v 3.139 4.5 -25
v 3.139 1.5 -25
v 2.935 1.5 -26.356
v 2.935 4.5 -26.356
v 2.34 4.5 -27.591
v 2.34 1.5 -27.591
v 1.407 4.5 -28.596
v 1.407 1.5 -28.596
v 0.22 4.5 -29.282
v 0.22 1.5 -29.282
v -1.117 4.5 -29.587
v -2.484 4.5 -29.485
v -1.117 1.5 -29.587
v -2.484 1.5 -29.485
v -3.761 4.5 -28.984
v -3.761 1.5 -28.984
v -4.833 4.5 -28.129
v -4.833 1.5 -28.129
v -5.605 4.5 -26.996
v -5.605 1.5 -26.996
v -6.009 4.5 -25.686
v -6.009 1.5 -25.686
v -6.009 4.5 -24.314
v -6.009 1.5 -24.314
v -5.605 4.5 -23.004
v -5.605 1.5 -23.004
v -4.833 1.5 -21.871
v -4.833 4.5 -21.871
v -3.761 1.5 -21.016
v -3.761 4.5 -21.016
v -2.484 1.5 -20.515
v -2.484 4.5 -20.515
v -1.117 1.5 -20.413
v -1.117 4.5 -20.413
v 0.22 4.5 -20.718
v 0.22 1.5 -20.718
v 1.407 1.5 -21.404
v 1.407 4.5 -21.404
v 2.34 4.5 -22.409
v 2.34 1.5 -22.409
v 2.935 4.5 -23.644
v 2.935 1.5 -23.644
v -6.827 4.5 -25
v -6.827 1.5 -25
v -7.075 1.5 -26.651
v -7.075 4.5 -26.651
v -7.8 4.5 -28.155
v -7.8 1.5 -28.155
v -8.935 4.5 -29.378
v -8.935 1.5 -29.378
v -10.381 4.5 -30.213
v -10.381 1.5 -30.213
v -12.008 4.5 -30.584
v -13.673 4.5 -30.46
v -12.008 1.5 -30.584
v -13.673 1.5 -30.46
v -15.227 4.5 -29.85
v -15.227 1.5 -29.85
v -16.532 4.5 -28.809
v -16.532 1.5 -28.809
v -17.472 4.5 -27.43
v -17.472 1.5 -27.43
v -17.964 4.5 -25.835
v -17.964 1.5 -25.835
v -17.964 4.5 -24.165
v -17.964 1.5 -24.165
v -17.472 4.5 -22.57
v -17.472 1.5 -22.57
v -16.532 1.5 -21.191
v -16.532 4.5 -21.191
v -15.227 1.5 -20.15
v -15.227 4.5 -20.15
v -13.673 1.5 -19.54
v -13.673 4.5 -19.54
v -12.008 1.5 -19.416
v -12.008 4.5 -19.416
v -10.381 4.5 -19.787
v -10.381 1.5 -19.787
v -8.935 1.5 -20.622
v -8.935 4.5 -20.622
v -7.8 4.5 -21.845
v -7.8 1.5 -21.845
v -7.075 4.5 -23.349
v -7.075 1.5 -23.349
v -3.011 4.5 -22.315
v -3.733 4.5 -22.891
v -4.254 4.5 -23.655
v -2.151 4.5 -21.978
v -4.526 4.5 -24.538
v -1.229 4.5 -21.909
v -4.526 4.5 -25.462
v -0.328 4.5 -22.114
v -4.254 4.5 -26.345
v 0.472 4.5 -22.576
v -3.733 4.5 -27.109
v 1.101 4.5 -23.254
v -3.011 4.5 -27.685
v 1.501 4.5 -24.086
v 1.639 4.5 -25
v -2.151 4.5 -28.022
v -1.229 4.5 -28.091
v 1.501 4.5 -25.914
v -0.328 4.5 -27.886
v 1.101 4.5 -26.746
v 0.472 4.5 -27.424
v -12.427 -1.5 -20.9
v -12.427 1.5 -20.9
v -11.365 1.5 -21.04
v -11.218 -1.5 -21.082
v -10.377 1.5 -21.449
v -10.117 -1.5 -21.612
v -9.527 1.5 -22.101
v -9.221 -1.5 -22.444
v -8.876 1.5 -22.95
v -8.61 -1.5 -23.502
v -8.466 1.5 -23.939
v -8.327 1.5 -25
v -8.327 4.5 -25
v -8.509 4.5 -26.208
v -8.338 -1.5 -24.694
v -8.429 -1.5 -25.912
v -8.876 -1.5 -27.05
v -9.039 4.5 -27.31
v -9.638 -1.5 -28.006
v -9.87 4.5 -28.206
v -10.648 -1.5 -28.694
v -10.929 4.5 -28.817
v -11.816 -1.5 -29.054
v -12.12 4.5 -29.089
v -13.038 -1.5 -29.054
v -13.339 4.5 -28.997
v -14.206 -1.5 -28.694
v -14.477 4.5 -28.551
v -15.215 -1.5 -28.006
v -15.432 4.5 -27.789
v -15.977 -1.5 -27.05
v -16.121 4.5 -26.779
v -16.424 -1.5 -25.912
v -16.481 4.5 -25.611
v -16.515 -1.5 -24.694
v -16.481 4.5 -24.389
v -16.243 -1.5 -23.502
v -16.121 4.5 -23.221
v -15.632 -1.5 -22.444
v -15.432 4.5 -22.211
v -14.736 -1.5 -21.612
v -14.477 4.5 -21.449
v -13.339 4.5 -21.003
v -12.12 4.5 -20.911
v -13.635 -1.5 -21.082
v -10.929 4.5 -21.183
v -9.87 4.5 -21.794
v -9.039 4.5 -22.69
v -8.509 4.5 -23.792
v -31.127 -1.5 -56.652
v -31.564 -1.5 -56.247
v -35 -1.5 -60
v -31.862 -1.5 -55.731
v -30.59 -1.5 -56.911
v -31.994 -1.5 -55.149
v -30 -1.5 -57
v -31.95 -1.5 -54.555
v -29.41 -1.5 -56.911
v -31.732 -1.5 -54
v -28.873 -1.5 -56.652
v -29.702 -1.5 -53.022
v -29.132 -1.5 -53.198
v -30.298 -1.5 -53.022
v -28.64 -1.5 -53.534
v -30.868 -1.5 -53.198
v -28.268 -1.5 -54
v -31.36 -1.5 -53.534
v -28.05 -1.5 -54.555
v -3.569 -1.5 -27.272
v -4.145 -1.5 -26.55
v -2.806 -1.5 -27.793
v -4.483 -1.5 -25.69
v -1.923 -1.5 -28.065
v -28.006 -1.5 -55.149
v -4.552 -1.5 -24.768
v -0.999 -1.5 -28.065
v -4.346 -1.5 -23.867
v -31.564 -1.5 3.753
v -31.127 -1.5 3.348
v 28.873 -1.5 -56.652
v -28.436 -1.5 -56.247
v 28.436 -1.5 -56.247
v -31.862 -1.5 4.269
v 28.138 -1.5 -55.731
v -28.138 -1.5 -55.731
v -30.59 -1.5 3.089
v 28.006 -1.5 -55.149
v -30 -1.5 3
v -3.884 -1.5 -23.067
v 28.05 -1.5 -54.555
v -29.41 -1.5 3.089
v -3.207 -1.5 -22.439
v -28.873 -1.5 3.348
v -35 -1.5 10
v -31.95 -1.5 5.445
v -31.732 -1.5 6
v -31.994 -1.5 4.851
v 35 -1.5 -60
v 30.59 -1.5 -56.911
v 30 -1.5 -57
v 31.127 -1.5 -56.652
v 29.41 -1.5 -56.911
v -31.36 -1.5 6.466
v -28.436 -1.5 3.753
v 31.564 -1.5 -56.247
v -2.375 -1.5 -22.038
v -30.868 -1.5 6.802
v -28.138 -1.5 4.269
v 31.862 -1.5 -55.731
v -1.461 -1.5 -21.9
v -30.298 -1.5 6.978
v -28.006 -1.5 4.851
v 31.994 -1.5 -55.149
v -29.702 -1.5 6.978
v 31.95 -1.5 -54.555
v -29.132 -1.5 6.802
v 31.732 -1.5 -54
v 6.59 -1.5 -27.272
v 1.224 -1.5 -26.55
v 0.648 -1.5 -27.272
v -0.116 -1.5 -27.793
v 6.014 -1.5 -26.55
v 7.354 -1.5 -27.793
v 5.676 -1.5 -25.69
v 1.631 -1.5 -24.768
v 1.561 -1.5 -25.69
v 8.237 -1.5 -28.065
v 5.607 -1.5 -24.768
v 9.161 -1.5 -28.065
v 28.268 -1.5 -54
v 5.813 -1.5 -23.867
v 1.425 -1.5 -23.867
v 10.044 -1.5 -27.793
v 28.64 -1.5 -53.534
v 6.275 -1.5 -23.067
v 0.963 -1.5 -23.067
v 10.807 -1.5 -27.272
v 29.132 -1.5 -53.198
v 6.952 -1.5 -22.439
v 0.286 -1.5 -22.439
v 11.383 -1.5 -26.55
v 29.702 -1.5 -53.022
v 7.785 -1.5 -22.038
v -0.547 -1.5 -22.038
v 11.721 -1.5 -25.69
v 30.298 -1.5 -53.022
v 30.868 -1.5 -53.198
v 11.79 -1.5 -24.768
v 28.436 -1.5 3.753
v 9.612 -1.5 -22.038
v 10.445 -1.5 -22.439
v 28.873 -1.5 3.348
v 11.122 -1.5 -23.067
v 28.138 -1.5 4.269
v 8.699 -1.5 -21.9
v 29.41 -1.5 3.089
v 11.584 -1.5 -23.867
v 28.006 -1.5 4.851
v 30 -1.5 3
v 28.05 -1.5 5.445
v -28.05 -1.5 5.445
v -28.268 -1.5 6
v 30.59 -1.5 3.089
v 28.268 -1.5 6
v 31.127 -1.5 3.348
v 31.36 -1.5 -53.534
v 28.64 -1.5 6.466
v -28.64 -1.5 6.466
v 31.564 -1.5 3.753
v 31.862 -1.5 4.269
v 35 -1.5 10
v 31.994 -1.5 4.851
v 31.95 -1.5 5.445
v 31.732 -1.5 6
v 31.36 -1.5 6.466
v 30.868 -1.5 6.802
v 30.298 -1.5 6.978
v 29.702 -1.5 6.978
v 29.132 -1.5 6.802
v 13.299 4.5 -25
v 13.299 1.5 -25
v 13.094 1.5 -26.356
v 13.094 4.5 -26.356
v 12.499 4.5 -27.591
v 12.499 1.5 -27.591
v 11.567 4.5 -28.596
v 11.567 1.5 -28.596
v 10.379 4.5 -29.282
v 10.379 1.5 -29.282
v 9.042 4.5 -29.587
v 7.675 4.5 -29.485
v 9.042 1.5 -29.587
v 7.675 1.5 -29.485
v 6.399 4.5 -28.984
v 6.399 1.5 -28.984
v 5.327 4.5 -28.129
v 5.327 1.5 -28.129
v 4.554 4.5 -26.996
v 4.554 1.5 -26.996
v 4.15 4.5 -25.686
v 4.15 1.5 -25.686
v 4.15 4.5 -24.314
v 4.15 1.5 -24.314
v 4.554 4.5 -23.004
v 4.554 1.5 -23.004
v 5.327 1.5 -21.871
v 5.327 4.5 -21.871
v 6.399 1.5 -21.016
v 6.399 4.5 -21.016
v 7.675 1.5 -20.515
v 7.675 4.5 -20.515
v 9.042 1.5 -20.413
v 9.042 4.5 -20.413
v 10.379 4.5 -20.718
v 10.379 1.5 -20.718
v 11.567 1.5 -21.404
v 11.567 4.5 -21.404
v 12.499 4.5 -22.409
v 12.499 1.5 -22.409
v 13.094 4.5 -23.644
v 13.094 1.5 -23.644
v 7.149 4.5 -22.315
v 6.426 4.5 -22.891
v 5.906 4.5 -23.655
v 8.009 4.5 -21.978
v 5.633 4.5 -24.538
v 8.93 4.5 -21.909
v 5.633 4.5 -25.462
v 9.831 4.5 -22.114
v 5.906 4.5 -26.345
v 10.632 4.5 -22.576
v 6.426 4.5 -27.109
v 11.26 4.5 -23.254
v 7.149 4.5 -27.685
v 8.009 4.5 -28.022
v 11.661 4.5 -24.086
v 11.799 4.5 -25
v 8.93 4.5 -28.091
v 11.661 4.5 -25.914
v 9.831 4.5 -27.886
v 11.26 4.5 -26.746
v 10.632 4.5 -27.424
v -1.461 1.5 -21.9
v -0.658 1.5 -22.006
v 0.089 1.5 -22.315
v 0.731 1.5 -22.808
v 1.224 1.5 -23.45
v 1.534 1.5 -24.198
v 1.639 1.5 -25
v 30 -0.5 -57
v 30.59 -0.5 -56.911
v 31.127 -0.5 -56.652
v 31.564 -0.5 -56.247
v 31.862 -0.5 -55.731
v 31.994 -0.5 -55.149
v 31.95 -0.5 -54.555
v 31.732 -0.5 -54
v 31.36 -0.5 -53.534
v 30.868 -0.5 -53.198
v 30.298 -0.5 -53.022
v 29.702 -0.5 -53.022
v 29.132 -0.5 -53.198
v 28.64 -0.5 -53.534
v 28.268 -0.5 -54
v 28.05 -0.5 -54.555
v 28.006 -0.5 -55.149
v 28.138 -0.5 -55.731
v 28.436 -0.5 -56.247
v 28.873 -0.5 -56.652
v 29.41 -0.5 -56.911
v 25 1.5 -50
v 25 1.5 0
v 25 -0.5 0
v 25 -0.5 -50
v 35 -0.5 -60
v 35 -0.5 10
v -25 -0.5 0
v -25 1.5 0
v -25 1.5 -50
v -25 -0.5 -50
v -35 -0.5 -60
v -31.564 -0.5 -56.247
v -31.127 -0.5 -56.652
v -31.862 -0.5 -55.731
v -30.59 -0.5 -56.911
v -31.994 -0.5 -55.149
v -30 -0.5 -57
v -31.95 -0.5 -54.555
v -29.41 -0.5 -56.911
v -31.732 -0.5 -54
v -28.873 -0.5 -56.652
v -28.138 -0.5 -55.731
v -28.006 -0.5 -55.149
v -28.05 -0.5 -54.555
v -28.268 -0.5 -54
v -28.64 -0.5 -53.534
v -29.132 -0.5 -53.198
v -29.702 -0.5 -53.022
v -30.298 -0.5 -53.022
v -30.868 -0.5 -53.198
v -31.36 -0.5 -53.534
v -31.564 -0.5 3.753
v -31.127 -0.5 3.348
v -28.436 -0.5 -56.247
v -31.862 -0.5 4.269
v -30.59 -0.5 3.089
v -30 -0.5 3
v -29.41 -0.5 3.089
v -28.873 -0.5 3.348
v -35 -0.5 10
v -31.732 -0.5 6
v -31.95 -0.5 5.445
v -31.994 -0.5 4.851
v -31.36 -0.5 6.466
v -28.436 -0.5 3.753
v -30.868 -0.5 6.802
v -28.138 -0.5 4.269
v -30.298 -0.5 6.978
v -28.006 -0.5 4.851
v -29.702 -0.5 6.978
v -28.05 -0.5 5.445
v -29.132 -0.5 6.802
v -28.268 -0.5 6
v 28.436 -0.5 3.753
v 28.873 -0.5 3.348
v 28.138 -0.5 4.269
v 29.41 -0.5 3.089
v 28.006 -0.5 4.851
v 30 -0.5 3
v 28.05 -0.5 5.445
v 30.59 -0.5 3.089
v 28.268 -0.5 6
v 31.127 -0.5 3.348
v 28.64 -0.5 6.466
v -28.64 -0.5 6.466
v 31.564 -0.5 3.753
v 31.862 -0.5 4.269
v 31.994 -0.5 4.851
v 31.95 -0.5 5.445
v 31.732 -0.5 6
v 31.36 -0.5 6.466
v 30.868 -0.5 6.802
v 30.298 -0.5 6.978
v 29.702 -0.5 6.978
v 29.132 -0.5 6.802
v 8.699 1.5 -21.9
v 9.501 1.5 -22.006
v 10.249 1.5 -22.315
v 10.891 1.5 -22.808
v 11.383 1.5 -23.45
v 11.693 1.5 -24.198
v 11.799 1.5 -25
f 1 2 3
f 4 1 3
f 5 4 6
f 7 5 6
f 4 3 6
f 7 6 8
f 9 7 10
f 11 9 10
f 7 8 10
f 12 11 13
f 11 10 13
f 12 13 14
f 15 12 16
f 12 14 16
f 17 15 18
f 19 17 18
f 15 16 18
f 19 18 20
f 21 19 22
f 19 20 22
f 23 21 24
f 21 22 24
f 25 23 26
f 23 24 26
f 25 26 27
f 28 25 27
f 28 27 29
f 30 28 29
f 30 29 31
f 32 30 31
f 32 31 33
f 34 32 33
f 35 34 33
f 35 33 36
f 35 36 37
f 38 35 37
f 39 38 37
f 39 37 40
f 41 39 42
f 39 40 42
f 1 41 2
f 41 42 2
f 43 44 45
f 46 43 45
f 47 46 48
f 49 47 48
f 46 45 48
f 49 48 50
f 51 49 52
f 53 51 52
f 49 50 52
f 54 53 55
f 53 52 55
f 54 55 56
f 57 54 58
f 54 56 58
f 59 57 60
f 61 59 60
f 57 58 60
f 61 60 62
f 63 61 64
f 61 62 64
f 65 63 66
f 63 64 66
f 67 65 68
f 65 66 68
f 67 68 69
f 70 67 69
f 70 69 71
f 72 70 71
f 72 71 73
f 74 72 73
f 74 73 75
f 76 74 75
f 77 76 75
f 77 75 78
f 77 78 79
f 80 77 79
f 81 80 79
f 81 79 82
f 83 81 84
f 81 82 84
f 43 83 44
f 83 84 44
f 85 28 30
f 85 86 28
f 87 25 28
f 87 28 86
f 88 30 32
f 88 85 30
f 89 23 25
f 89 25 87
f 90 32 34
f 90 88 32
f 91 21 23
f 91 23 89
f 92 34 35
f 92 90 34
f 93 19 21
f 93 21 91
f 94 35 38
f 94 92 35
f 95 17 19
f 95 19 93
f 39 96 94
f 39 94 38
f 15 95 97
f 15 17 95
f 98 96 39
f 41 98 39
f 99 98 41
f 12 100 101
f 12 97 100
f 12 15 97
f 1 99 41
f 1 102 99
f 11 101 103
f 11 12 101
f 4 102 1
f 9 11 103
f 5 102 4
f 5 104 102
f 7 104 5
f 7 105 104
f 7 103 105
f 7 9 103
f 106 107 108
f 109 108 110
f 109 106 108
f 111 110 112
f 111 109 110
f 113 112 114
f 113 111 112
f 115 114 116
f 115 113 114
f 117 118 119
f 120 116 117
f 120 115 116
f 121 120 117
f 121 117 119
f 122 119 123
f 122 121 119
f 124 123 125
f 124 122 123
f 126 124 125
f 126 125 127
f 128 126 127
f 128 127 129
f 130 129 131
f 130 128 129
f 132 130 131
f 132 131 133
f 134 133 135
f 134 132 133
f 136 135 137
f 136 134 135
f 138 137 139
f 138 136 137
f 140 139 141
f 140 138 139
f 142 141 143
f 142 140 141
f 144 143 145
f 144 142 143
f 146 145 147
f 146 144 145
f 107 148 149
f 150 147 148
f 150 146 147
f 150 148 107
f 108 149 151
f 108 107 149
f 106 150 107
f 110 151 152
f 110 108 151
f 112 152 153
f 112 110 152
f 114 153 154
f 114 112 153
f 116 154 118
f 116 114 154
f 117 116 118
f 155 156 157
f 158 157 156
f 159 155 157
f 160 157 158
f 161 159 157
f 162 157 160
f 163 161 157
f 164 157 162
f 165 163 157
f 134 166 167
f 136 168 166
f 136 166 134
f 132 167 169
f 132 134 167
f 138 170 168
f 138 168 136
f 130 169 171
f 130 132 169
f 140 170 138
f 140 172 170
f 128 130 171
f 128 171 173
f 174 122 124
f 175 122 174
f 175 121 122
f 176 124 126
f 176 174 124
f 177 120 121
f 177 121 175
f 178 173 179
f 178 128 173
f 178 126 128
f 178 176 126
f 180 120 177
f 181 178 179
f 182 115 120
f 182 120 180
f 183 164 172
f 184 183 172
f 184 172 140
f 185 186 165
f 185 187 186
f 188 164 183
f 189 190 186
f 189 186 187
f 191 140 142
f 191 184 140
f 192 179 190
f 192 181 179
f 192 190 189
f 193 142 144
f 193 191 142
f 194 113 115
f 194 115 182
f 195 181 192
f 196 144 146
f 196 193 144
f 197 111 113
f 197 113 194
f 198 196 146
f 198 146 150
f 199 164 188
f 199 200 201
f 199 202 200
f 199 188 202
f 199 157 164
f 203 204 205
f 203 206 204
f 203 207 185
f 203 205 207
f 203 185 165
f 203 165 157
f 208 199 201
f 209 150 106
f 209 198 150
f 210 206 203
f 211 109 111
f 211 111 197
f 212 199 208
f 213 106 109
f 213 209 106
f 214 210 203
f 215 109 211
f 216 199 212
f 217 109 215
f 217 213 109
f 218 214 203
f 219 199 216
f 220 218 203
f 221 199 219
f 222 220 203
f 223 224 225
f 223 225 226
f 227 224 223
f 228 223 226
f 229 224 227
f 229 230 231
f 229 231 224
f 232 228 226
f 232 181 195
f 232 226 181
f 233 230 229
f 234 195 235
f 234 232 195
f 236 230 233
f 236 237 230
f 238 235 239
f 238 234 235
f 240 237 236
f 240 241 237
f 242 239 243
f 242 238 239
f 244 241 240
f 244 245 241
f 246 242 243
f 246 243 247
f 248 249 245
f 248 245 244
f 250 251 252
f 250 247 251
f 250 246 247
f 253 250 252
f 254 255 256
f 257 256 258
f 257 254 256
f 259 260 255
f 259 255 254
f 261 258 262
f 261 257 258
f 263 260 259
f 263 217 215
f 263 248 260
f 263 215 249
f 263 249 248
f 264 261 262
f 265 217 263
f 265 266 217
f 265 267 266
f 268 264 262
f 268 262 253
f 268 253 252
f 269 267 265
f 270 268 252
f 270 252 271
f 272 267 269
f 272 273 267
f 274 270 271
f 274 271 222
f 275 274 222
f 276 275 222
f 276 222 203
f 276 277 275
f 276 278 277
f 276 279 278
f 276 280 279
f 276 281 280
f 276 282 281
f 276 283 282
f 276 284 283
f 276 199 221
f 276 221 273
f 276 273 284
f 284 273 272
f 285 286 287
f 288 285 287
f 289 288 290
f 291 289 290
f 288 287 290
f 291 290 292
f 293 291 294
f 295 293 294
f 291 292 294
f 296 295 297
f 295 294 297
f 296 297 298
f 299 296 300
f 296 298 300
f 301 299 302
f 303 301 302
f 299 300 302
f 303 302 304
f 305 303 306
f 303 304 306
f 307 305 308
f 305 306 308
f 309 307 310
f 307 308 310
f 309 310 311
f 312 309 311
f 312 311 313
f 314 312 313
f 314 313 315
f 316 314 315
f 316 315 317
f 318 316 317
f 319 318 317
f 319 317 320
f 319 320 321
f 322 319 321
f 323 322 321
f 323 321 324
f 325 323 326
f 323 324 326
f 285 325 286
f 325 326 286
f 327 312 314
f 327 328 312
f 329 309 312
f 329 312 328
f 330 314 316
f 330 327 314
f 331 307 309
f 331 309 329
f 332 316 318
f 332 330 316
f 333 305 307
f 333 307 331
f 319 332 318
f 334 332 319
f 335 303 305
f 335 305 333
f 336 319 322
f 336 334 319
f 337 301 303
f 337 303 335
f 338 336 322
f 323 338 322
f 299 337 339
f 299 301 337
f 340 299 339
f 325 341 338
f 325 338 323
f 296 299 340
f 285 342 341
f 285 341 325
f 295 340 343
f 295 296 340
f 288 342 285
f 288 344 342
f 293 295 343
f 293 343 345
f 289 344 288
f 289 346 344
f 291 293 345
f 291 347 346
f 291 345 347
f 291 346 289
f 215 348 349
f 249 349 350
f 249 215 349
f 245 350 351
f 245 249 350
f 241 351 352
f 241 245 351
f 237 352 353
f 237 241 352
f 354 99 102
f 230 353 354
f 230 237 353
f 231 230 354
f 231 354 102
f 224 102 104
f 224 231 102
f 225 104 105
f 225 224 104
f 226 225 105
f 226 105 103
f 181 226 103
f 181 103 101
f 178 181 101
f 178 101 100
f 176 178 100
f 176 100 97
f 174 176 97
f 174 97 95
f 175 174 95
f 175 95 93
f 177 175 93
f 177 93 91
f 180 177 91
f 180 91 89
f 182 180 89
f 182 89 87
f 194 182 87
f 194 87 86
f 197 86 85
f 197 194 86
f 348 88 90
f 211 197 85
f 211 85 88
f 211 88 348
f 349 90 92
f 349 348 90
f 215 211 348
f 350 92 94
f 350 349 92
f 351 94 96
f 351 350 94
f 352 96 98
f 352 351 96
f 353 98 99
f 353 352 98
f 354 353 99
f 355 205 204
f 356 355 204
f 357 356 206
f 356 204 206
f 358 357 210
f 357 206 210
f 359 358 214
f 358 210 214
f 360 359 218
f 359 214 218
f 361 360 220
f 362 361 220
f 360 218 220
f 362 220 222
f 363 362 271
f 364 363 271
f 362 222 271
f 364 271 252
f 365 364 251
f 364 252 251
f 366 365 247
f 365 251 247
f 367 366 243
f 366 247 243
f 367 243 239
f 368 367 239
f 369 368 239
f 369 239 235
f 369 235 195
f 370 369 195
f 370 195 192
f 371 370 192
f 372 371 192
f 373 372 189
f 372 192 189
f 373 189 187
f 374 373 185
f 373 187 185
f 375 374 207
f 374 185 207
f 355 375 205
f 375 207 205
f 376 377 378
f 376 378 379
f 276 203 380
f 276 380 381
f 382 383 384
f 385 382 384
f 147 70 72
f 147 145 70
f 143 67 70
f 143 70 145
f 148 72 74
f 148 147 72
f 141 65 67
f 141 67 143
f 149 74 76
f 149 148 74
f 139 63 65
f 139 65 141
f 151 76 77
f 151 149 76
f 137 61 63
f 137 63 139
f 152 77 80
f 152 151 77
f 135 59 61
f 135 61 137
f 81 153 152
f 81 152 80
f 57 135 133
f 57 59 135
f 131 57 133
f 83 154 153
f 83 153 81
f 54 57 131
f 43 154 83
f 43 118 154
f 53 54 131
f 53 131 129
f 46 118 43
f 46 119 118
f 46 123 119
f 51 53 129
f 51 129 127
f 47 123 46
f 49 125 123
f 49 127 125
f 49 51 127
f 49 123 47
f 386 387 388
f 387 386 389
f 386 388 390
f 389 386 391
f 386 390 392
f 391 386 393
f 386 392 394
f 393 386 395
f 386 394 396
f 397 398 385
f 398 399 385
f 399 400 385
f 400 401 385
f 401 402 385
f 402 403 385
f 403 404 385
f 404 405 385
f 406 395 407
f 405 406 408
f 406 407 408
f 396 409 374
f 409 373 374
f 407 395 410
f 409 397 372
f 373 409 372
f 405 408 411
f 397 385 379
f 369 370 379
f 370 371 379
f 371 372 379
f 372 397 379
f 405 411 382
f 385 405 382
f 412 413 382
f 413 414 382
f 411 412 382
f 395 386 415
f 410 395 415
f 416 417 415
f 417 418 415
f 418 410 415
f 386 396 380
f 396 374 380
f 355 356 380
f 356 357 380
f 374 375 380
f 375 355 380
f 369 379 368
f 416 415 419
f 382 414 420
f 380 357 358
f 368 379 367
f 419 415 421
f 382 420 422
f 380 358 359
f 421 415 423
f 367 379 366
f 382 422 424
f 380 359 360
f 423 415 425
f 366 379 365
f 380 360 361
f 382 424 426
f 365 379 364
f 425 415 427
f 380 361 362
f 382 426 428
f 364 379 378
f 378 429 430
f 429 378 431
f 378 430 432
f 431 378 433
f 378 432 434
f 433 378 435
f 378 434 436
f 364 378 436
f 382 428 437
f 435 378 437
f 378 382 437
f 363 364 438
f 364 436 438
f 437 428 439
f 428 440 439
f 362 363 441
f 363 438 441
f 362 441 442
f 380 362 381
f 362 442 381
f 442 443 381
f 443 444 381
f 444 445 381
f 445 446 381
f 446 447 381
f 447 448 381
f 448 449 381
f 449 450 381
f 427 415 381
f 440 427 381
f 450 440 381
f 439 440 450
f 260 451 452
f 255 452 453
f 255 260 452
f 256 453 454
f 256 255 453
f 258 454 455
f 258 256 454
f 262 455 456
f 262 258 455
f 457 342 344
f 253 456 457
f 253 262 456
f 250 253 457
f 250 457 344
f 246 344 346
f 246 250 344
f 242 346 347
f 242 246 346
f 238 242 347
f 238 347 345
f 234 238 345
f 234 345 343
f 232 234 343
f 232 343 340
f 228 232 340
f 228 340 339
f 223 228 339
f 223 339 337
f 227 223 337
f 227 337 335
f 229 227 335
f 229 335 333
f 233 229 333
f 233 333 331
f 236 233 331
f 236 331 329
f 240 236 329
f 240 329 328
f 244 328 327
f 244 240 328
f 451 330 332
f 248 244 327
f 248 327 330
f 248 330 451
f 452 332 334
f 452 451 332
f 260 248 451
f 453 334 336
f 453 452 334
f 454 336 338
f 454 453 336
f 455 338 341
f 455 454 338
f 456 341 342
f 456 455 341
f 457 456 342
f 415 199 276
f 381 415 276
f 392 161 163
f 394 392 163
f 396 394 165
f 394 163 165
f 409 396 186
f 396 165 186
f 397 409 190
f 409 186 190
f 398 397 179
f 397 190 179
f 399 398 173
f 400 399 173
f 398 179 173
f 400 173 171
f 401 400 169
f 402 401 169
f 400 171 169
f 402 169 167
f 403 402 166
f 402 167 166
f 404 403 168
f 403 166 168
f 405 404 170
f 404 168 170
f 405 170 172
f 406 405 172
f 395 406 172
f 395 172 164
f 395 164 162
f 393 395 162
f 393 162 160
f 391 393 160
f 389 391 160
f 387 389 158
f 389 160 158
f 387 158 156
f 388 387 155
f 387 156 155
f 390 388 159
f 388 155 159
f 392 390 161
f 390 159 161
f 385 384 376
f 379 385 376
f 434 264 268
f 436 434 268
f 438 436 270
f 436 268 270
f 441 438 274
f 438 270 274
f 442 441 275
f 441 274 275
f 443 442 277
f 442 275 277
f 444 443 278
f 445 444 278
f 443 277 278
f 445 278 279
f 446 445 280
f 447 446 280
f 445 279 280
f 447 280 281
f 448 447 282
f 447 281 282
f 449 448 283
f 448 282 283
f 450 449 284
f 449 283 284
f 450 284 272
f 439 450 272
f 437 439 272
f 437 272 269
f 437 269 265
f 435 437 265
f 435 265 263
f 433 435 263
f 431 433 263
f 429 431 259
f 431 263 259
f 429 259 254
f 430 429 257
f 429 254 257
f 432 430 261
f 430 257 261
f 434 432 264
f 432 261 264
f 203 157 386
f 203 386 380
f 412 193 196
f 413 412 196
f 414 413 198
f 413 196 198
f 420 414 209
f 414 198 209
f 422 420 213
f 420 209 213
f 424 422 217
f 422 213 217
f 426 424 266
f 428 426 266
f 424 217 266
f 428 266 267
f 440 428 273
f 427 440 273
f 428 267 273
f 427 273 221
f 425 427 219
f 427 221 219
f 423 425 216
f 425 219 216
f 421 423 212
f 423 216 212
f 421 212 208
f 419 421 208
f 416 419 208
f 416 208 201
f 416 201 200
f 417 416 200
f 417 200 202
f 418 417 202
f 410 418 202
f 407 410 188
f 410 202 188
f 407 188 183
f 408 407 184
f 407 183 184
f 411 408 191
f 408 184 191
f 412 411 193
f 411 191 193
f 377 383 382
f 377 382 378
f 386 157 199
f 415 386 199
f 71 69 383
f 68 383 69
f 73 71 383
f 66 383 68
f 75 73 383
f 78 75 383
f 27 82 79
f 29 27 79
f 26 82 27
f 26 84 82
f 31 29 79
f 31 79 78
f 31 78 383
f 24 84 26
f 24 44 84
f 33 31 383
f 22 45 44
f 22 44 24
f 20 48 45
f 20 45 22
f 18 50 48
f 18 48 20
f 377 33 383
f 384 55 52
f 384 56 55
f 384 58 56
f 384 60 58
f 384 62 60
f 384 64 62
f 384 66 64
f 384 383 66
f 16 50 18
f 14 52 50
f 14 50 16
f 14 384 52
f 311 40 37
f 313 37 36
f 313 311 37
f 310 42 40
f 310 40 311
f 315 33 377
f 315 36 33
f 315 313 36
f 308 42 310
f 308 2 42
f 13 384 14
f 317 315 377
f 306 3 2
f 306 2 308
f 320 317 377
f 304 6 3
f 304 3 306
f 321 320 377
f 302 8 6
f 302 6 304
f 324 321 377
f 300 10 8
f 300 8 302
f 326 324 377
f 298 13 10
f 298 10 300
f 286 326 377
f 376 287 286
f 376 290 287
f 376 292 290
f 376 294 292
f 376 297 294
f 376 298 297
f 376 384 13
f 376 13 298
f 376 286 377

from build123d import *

# Parameters (mm, degrees)
SKETCH1_W           = 50
SKETCH1_H           = 50
SKETCH1_R           = 4.1
SKETCH1_R_2         = 3.1
BOSS_EXTRUDE1_DEPTH = 1.5
SKETCH2_R           = 5.6
SKETCH2_R_2         = 4.1
SKETCH2_R_3         = 4.6
SKETCH2_R_4         = 3.1
EXTRUDE_THIN1_DEPTH = 3
SKETCH3_W           = 70
SKETCH3_H           = 70
SKETCH3_R           = 2
SKETCH3_W_2         = 50
SKETCH3_H_2         = 50
BOSS_EXTRUDE2_DEPTH = 1


with BuildPart() as part:
    # Sketch1 → Boss-Extrude1 (new, symmetric)
    with BuildSketch(Plane(origin=(0, 0, 0), x_dir=(1, 0, 0), z_dir=(0, 1, 0))):
        with Locations((0, 25)):
            Rectangle(SKETCH1_W, SKETCH1_H)
        with Locations(Location((-12.426592672, 25, 0), (0, 0, 270))):
            Circle(SKETCH1_R, mode=Mode.SUBTRACT)
        with Locations(Location((-1.460779325, 25, 0), (0, 0, 270))):
            Circle(SKETCH1_R_2, mode=Mode.SUBTRACT)
        with Locations(Location((8.698724218, 25, 0), (0, 0, 270))):
            Circle(SKETCH1_R_2, mode=Mode.SUBTRACT)
    extrude(amount=BOSS_EXTRUDE1_DEPTH, both=True)

    # Sketch2 → Extrude-Thin1 (add)
    # profile 1 of 3: a face of its own
    with BuildSketch(Plane(origin=(0, 1.5, 0), x_dir=(1, 0, 0), z_dir=(0, 1, 0))):
        with Locations((-12.426592672, 25)):
            Circle(SKETCH2_R)
        with Locations((-12.426592672, 25)):
            Circle(SKETCH2_R_2, mode=Mode.SUBTRACT)
    # profile 2 of 3: a face of its own
    with BuildSketch(Plane(origin=(0, 1.5, 0), x_dir=(1, 0, 0), z_dir=(0, 1, 0))):
        with Locations((8.698724218, 25)):
            Circle(SKETCH2_R_3)
        with Locations((8.698724218, 25)):
            Circle(SKETCH2_R_4, mode=Mode.SUBTRACT)
    # profile 3 of 3: a face of its own
    with BuildSketch(Plane(origin=(0, 1.5, 0), x_dir=(1, 0, 0), z_dir=(0, 1, 0))):
        with Locations((-1.460779325, 25)):
            Circle(SKETCH2_R_3)
        with Locations((-1.460779325, 25)):
            Circle(SKETCH2_R_4, mode=Mode.SUBTRACT)
    extrude(amount=EXTRUDE_THIN1_DEPTH)

    # Sketch3 → Boss-Extrude2 (add)
    with BuildSketch(Plane.XZ.offset(1.5)):
        with Locations((0, -25)):
            Rectangle(SKETCH3_W, SKETCH3_H)
        with Locations(Location((-30, 5, 0), (0, 0, 270))):
            Circle(SKETCH3_R, mode=Mode.SUBTRACT)
        with Locations(Location((30, 5, 0), (0, 0, 270))):
            Circle(SKETCH3_R, mode=Mode.SUBTRACT)
        with Locations(Location((30, -55, 0), (0, 0, 270))):
            Circle(SKETCH3_R, mode=Mode.SUBTRACT)
        with Locations(Location((-30, -55, 0), (0, 0, 270))):
            Circle(SKETCH3_R, mode=Mode.SUBTRACT)
        with Locations((0, -25)):
            Rectangle(SKETCH3_W_2, SKETCH3_H_2, mode=Mode.SUBTRACT)
    extrude(amount=-BOSS_EXTRUDE2_DEPTH)


solid = part.part
